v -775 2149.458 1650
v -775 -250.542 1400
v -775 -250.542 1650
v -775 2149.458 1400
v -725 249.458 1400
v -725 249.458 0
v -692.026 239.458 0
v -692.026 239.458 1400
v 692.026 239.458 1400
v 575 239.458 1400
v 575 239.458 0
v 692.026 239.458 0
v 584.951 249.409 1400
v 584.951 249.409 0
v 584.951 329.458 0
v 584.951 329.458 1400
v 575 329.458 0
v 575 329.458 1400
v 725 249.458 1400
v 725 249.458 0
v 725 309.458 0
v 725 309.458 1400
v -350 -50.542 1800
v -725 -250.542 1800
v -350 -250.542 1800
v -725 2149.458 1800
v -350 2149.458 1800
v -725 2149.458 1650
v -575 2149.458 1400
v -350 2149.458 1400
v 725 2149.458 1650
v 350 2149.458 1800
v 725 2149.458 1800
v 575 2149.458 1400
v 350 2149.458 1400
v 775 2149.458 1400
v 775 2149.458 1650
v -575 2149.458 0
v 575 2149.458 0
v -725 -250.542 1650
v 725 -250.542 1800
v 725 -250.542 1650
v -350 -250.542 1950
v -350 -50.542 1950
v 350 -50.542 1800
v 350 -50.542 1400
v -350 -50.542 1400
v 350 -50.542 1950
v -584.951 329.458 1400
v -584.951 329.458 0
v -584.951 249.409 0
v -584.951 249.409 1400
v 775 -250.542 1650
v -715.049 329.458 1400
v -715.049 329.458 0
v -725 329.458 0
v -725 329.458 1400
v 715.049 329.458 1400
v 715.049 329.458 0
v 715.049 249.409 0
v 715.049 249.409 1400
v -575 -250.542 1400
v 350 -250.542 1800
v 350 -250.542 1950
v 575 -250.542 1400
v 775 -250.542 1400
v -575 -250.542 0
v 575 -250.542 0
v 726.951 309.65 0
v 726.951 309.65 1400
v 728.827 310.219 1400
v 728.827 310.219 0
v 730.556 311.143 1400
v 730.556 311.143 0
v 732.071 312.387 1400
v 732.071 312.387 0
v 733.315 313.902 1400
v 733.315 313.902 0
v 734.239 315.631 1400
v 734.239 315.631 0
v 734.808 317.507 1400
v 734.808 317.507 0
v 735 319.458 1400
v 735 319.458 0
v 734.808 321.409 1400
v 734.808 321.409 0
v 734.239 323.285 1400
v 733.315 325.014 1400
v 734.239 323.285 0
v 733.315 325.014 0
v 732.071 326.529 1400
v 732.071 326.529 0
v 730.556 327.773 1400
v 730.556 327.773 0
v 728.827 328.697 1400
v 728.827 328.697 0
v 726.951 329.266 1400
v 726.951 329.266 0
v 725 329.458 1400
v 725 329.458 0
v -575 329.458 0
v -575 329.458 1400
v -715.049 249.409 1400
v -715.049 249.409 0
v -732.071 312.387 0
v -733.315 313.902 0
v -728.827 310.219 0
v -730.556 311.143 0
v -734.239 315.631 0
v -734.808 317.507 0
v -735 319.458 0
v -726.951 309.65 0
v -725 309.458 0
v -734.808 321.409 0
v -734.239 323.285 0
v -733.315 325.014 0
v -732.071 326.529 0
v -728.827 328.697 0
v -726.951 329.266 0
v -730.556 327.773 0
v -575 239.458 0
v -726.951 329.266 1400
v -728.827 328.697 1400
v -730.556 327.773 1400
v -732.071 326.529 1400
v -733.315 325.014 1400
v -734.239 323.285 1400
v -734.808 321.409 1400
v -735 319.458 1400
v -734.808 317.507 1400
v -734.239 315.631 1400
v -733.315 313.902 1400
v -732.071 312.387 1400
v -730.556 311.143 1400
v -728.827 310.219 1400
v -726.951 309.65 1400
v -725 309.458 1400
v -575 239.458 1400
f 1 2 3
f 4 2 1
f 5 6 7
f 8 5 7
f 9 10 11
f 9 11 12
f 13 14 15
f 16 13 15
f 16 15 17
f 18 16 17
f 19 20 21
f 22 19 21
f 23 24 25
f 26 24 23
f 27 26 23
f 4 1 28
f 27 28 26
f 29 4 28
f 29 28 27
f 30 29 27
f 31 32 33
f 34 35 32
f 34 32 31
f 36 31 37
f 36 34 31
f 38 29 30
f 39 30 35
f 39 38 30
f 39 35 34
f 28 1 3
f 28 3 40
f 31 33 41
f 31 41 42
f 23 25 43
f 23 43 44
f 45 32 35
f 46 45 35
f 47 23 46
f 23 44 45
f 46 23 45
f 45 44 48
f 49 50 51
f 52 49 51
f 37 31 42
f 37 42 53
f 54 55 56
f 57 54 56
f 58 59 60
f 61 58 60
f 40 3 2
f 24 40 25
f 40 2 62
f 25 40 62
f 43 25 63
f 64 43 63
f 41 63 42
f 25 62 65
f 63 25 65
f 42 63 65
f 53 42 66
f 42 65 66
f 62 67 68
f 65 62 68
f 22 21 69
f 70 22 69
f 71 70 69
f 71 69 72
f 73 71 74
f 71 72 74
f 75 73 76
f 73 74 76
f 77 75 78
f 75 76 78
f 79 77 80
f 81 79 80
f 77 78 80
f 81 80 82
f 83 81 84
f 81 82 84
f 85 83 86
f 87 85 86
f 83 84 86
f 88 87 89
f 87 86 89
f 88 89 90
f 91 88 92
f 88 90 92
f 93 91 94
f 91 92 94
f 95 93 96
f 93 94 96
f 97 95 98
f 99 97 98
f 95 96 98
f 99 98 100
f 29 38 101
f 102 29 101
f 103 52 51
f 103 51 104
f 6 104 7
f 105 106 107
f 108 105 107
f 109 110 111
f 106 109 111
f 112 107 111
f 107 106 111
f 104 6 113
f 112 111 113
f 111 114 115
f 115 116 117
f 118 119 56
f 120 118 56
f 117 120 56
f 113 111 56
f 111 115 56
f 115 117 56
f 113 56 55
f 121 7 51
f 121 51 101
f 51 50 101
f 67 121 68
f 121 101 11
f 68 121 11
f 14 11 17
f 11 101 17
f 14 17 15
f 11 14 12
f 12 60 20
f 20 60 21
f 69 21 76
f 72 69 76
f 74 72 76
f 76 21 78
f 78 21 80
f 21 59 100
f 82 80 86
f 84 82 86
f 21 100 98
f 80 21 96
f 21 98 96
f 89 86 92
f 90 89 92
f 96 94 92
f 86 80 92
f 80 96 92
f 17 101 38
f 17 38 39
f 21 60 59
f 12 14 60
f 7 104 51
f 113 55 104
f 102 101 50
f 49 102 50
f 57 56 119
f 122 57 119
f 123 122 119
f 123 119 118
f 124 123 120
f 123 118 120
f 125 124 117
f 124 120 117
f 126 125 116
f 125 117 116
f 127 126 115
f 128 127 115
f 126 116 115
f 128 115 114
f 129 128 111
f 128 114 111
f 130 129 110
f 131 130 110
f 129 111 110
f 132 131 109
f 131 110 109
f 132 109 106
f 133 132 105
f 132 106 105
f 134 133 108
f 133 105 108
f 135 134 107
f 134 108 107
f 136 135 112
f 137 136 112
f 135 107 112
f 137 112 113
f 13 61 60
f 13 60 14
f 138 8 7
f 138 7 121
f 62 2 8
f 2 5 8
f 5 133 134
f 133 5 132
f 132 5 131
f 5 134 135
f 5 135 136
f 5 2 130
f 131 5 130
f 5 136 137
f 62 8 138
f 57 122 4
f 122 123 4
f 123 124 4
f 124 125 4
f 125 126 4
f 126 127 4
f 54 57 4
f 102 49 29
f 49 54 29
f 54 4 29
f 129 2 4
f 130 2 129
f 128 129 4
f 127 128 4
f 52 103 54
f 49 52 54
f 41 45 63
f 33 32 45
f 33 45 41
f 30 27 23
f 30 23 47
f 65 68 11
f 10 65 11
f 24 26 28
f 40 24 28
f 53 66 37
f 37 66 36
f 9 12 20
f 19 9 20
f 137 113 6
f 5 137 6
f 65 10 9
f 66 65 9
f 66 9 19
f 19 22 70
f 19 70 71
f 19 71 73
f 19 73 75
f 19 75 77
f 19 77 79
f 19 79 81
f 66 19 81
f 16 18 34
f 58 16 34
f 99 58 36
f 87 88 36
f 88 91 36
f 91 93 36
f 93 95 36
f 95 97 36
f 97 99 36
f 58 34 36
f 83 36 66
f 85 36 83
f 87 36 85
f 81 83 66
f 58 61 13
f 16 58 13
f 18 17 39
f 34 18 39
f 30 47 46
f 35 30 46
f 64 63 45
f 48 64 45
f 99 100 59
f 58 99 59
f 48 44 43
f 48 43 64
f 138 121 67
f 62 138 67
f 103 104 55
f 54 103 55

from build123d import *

# Parameters (mm, degrees)
EXTRUDE_1_DEPTH      = 1400
SKETCH_3_W           = 1550
SKETCH_3_H           = 2400
EXTRUDE_2_DEPTH      = 400
SKETCH_4_W           = 50
SKETCH_4_H           = 150
SKETCH_4_W_2         = 700
SKETCH_4_H_2         = 400
CUT_EXTRUDE_1_DEPTH  = 2401
SKETCH_5_W           = 700
SKETCH_5_H           = 200
EXTRUDE_3_DEPTH      = 150
EXTRUDE_3_DEPTH_BACK = 1800


with BuildPart() as part:
    # 草圖1 → 填料-伸長1 (new body)
    with BuildSketch(Plane.XY):
        with BuildLine():
            ThreePointArc((-725, 329.458185741), (-735, 319.458185741), (-725, 309.458185741))
            Line((-725, 309.458185741), (-725, 249.458185741))
            Line((-725, 249.458185741), (-692.026095563, 239.458185741))
            Line((-692.026095563, 239.458185741), (-575, 239.458185741))
            Line((-575, 239.458185741), (-575, -250.541814259))
            Line((-575, -250.541814259), (0, -250.541814259))
            Line((0, -250.541814259), (0, 2149.458185741))
            Line((0, 2149.458185741), (-575, 2149.458185741))
            Line((-575, 2149.458185741), (-575, 329.458185741))
            Line((-575, 329.458185741), (-584.95081424, 329.458185741))
            Line((-584.95081424, 329.458185741), (-584.95081424, 249.408999982))
            Line((-584.95081424, 249.408999982), (-715.04918576, 249.408999982))
            Line((-715.04918576, 249.408999982), (-715.04918576, 329.458185741))
            Line((-715.04918576, 329.458185741), (-725, 329.458185741))
        make_face()
        with BuildLine():
            Line((0, 2149.458185741), (0, -250.541814259))
            Line((0, -250.541814259), (575, -250.541814259))
            Line((575, -250.541814259), (575, 239.458185741))
            Line((575, 239.458185741), (692.026095563, 239.458185741))
            Line((692.026095563, 239.458185741), (725, 249.458185741))
            Line((725, 249.458185741), (725, 309.458185741))
            ThreePointArc((725, 309.458185741), (735, 319.458185741), (725, 329.458185741))
            Line((725, 329.458185741), (715.04918576, 329.458185741))
            Line((715.04918576, 329.458185741), (715.04918576, 249.408999982))
            Line((715.04918576, 249.408999982), (584.95081424, 249.408999982))
            Line((584.95081424, 249.408999982), (584.95081424, 329.458185741))
            Line((584.95081424, 329.458185741), (575, 329.458185741))
            Line((575, 329.458185741), (575, 2149.458185741))
            Line((575, 2149.458185741), (0, 2149.458185741))
        make_face()
    extrude(amount=EXTRUDE_1_DEPTH)

    # 草圖3 → 填料-伸長2 (add)
    with BuildSketch(Plane.XY.offset(1400)):
        with Locations((0, 949.458185741)):
            Rectangle(SKETCH_3_W, SKETCH_3_H)
    extrude(amount=EXTRUDE_2_DEPTH)

    # 草圖4 → 除料-伸長1 (cut, through all)
    with BuildSketch(Plane(origin=(0, 2149.458185741, 0), x_dir=(1, 0, 0), z_dir=(0, 1, 0))):
        with Locations((-750, -1725)):
            Rectangle(SKETCH_4_W, SKETCH_4_H)
        with Locations((750, -1725)):
            Rectangle(SKETCH_4_W, SKETCH_4_H)
        with Locations((0, -1600)):
            Rectangle(SKETCH_4_W_2, SKETCH_4_H_2)
    extrude(amount=-CUT_EXTRUDE_1_DEPTH, mode=Mode.SUBTRACT)

    # 草圖5 → 填料-伸長3 (add, two sides)
    with BuildSketch(Plane.XY.offset(1800)) as extrude_3_sk:
        with Locations((0, -150.541814259)):
            Rectangle(SKETCH_5_W, SKETCH_5_H)
    extrude(amount=EXTRUDE_3_DEPTH)
    extrude(extrude_3_sk.sketch, amount=-EXTRUDE_3_DEPTH_BACK)


solid = part.part
